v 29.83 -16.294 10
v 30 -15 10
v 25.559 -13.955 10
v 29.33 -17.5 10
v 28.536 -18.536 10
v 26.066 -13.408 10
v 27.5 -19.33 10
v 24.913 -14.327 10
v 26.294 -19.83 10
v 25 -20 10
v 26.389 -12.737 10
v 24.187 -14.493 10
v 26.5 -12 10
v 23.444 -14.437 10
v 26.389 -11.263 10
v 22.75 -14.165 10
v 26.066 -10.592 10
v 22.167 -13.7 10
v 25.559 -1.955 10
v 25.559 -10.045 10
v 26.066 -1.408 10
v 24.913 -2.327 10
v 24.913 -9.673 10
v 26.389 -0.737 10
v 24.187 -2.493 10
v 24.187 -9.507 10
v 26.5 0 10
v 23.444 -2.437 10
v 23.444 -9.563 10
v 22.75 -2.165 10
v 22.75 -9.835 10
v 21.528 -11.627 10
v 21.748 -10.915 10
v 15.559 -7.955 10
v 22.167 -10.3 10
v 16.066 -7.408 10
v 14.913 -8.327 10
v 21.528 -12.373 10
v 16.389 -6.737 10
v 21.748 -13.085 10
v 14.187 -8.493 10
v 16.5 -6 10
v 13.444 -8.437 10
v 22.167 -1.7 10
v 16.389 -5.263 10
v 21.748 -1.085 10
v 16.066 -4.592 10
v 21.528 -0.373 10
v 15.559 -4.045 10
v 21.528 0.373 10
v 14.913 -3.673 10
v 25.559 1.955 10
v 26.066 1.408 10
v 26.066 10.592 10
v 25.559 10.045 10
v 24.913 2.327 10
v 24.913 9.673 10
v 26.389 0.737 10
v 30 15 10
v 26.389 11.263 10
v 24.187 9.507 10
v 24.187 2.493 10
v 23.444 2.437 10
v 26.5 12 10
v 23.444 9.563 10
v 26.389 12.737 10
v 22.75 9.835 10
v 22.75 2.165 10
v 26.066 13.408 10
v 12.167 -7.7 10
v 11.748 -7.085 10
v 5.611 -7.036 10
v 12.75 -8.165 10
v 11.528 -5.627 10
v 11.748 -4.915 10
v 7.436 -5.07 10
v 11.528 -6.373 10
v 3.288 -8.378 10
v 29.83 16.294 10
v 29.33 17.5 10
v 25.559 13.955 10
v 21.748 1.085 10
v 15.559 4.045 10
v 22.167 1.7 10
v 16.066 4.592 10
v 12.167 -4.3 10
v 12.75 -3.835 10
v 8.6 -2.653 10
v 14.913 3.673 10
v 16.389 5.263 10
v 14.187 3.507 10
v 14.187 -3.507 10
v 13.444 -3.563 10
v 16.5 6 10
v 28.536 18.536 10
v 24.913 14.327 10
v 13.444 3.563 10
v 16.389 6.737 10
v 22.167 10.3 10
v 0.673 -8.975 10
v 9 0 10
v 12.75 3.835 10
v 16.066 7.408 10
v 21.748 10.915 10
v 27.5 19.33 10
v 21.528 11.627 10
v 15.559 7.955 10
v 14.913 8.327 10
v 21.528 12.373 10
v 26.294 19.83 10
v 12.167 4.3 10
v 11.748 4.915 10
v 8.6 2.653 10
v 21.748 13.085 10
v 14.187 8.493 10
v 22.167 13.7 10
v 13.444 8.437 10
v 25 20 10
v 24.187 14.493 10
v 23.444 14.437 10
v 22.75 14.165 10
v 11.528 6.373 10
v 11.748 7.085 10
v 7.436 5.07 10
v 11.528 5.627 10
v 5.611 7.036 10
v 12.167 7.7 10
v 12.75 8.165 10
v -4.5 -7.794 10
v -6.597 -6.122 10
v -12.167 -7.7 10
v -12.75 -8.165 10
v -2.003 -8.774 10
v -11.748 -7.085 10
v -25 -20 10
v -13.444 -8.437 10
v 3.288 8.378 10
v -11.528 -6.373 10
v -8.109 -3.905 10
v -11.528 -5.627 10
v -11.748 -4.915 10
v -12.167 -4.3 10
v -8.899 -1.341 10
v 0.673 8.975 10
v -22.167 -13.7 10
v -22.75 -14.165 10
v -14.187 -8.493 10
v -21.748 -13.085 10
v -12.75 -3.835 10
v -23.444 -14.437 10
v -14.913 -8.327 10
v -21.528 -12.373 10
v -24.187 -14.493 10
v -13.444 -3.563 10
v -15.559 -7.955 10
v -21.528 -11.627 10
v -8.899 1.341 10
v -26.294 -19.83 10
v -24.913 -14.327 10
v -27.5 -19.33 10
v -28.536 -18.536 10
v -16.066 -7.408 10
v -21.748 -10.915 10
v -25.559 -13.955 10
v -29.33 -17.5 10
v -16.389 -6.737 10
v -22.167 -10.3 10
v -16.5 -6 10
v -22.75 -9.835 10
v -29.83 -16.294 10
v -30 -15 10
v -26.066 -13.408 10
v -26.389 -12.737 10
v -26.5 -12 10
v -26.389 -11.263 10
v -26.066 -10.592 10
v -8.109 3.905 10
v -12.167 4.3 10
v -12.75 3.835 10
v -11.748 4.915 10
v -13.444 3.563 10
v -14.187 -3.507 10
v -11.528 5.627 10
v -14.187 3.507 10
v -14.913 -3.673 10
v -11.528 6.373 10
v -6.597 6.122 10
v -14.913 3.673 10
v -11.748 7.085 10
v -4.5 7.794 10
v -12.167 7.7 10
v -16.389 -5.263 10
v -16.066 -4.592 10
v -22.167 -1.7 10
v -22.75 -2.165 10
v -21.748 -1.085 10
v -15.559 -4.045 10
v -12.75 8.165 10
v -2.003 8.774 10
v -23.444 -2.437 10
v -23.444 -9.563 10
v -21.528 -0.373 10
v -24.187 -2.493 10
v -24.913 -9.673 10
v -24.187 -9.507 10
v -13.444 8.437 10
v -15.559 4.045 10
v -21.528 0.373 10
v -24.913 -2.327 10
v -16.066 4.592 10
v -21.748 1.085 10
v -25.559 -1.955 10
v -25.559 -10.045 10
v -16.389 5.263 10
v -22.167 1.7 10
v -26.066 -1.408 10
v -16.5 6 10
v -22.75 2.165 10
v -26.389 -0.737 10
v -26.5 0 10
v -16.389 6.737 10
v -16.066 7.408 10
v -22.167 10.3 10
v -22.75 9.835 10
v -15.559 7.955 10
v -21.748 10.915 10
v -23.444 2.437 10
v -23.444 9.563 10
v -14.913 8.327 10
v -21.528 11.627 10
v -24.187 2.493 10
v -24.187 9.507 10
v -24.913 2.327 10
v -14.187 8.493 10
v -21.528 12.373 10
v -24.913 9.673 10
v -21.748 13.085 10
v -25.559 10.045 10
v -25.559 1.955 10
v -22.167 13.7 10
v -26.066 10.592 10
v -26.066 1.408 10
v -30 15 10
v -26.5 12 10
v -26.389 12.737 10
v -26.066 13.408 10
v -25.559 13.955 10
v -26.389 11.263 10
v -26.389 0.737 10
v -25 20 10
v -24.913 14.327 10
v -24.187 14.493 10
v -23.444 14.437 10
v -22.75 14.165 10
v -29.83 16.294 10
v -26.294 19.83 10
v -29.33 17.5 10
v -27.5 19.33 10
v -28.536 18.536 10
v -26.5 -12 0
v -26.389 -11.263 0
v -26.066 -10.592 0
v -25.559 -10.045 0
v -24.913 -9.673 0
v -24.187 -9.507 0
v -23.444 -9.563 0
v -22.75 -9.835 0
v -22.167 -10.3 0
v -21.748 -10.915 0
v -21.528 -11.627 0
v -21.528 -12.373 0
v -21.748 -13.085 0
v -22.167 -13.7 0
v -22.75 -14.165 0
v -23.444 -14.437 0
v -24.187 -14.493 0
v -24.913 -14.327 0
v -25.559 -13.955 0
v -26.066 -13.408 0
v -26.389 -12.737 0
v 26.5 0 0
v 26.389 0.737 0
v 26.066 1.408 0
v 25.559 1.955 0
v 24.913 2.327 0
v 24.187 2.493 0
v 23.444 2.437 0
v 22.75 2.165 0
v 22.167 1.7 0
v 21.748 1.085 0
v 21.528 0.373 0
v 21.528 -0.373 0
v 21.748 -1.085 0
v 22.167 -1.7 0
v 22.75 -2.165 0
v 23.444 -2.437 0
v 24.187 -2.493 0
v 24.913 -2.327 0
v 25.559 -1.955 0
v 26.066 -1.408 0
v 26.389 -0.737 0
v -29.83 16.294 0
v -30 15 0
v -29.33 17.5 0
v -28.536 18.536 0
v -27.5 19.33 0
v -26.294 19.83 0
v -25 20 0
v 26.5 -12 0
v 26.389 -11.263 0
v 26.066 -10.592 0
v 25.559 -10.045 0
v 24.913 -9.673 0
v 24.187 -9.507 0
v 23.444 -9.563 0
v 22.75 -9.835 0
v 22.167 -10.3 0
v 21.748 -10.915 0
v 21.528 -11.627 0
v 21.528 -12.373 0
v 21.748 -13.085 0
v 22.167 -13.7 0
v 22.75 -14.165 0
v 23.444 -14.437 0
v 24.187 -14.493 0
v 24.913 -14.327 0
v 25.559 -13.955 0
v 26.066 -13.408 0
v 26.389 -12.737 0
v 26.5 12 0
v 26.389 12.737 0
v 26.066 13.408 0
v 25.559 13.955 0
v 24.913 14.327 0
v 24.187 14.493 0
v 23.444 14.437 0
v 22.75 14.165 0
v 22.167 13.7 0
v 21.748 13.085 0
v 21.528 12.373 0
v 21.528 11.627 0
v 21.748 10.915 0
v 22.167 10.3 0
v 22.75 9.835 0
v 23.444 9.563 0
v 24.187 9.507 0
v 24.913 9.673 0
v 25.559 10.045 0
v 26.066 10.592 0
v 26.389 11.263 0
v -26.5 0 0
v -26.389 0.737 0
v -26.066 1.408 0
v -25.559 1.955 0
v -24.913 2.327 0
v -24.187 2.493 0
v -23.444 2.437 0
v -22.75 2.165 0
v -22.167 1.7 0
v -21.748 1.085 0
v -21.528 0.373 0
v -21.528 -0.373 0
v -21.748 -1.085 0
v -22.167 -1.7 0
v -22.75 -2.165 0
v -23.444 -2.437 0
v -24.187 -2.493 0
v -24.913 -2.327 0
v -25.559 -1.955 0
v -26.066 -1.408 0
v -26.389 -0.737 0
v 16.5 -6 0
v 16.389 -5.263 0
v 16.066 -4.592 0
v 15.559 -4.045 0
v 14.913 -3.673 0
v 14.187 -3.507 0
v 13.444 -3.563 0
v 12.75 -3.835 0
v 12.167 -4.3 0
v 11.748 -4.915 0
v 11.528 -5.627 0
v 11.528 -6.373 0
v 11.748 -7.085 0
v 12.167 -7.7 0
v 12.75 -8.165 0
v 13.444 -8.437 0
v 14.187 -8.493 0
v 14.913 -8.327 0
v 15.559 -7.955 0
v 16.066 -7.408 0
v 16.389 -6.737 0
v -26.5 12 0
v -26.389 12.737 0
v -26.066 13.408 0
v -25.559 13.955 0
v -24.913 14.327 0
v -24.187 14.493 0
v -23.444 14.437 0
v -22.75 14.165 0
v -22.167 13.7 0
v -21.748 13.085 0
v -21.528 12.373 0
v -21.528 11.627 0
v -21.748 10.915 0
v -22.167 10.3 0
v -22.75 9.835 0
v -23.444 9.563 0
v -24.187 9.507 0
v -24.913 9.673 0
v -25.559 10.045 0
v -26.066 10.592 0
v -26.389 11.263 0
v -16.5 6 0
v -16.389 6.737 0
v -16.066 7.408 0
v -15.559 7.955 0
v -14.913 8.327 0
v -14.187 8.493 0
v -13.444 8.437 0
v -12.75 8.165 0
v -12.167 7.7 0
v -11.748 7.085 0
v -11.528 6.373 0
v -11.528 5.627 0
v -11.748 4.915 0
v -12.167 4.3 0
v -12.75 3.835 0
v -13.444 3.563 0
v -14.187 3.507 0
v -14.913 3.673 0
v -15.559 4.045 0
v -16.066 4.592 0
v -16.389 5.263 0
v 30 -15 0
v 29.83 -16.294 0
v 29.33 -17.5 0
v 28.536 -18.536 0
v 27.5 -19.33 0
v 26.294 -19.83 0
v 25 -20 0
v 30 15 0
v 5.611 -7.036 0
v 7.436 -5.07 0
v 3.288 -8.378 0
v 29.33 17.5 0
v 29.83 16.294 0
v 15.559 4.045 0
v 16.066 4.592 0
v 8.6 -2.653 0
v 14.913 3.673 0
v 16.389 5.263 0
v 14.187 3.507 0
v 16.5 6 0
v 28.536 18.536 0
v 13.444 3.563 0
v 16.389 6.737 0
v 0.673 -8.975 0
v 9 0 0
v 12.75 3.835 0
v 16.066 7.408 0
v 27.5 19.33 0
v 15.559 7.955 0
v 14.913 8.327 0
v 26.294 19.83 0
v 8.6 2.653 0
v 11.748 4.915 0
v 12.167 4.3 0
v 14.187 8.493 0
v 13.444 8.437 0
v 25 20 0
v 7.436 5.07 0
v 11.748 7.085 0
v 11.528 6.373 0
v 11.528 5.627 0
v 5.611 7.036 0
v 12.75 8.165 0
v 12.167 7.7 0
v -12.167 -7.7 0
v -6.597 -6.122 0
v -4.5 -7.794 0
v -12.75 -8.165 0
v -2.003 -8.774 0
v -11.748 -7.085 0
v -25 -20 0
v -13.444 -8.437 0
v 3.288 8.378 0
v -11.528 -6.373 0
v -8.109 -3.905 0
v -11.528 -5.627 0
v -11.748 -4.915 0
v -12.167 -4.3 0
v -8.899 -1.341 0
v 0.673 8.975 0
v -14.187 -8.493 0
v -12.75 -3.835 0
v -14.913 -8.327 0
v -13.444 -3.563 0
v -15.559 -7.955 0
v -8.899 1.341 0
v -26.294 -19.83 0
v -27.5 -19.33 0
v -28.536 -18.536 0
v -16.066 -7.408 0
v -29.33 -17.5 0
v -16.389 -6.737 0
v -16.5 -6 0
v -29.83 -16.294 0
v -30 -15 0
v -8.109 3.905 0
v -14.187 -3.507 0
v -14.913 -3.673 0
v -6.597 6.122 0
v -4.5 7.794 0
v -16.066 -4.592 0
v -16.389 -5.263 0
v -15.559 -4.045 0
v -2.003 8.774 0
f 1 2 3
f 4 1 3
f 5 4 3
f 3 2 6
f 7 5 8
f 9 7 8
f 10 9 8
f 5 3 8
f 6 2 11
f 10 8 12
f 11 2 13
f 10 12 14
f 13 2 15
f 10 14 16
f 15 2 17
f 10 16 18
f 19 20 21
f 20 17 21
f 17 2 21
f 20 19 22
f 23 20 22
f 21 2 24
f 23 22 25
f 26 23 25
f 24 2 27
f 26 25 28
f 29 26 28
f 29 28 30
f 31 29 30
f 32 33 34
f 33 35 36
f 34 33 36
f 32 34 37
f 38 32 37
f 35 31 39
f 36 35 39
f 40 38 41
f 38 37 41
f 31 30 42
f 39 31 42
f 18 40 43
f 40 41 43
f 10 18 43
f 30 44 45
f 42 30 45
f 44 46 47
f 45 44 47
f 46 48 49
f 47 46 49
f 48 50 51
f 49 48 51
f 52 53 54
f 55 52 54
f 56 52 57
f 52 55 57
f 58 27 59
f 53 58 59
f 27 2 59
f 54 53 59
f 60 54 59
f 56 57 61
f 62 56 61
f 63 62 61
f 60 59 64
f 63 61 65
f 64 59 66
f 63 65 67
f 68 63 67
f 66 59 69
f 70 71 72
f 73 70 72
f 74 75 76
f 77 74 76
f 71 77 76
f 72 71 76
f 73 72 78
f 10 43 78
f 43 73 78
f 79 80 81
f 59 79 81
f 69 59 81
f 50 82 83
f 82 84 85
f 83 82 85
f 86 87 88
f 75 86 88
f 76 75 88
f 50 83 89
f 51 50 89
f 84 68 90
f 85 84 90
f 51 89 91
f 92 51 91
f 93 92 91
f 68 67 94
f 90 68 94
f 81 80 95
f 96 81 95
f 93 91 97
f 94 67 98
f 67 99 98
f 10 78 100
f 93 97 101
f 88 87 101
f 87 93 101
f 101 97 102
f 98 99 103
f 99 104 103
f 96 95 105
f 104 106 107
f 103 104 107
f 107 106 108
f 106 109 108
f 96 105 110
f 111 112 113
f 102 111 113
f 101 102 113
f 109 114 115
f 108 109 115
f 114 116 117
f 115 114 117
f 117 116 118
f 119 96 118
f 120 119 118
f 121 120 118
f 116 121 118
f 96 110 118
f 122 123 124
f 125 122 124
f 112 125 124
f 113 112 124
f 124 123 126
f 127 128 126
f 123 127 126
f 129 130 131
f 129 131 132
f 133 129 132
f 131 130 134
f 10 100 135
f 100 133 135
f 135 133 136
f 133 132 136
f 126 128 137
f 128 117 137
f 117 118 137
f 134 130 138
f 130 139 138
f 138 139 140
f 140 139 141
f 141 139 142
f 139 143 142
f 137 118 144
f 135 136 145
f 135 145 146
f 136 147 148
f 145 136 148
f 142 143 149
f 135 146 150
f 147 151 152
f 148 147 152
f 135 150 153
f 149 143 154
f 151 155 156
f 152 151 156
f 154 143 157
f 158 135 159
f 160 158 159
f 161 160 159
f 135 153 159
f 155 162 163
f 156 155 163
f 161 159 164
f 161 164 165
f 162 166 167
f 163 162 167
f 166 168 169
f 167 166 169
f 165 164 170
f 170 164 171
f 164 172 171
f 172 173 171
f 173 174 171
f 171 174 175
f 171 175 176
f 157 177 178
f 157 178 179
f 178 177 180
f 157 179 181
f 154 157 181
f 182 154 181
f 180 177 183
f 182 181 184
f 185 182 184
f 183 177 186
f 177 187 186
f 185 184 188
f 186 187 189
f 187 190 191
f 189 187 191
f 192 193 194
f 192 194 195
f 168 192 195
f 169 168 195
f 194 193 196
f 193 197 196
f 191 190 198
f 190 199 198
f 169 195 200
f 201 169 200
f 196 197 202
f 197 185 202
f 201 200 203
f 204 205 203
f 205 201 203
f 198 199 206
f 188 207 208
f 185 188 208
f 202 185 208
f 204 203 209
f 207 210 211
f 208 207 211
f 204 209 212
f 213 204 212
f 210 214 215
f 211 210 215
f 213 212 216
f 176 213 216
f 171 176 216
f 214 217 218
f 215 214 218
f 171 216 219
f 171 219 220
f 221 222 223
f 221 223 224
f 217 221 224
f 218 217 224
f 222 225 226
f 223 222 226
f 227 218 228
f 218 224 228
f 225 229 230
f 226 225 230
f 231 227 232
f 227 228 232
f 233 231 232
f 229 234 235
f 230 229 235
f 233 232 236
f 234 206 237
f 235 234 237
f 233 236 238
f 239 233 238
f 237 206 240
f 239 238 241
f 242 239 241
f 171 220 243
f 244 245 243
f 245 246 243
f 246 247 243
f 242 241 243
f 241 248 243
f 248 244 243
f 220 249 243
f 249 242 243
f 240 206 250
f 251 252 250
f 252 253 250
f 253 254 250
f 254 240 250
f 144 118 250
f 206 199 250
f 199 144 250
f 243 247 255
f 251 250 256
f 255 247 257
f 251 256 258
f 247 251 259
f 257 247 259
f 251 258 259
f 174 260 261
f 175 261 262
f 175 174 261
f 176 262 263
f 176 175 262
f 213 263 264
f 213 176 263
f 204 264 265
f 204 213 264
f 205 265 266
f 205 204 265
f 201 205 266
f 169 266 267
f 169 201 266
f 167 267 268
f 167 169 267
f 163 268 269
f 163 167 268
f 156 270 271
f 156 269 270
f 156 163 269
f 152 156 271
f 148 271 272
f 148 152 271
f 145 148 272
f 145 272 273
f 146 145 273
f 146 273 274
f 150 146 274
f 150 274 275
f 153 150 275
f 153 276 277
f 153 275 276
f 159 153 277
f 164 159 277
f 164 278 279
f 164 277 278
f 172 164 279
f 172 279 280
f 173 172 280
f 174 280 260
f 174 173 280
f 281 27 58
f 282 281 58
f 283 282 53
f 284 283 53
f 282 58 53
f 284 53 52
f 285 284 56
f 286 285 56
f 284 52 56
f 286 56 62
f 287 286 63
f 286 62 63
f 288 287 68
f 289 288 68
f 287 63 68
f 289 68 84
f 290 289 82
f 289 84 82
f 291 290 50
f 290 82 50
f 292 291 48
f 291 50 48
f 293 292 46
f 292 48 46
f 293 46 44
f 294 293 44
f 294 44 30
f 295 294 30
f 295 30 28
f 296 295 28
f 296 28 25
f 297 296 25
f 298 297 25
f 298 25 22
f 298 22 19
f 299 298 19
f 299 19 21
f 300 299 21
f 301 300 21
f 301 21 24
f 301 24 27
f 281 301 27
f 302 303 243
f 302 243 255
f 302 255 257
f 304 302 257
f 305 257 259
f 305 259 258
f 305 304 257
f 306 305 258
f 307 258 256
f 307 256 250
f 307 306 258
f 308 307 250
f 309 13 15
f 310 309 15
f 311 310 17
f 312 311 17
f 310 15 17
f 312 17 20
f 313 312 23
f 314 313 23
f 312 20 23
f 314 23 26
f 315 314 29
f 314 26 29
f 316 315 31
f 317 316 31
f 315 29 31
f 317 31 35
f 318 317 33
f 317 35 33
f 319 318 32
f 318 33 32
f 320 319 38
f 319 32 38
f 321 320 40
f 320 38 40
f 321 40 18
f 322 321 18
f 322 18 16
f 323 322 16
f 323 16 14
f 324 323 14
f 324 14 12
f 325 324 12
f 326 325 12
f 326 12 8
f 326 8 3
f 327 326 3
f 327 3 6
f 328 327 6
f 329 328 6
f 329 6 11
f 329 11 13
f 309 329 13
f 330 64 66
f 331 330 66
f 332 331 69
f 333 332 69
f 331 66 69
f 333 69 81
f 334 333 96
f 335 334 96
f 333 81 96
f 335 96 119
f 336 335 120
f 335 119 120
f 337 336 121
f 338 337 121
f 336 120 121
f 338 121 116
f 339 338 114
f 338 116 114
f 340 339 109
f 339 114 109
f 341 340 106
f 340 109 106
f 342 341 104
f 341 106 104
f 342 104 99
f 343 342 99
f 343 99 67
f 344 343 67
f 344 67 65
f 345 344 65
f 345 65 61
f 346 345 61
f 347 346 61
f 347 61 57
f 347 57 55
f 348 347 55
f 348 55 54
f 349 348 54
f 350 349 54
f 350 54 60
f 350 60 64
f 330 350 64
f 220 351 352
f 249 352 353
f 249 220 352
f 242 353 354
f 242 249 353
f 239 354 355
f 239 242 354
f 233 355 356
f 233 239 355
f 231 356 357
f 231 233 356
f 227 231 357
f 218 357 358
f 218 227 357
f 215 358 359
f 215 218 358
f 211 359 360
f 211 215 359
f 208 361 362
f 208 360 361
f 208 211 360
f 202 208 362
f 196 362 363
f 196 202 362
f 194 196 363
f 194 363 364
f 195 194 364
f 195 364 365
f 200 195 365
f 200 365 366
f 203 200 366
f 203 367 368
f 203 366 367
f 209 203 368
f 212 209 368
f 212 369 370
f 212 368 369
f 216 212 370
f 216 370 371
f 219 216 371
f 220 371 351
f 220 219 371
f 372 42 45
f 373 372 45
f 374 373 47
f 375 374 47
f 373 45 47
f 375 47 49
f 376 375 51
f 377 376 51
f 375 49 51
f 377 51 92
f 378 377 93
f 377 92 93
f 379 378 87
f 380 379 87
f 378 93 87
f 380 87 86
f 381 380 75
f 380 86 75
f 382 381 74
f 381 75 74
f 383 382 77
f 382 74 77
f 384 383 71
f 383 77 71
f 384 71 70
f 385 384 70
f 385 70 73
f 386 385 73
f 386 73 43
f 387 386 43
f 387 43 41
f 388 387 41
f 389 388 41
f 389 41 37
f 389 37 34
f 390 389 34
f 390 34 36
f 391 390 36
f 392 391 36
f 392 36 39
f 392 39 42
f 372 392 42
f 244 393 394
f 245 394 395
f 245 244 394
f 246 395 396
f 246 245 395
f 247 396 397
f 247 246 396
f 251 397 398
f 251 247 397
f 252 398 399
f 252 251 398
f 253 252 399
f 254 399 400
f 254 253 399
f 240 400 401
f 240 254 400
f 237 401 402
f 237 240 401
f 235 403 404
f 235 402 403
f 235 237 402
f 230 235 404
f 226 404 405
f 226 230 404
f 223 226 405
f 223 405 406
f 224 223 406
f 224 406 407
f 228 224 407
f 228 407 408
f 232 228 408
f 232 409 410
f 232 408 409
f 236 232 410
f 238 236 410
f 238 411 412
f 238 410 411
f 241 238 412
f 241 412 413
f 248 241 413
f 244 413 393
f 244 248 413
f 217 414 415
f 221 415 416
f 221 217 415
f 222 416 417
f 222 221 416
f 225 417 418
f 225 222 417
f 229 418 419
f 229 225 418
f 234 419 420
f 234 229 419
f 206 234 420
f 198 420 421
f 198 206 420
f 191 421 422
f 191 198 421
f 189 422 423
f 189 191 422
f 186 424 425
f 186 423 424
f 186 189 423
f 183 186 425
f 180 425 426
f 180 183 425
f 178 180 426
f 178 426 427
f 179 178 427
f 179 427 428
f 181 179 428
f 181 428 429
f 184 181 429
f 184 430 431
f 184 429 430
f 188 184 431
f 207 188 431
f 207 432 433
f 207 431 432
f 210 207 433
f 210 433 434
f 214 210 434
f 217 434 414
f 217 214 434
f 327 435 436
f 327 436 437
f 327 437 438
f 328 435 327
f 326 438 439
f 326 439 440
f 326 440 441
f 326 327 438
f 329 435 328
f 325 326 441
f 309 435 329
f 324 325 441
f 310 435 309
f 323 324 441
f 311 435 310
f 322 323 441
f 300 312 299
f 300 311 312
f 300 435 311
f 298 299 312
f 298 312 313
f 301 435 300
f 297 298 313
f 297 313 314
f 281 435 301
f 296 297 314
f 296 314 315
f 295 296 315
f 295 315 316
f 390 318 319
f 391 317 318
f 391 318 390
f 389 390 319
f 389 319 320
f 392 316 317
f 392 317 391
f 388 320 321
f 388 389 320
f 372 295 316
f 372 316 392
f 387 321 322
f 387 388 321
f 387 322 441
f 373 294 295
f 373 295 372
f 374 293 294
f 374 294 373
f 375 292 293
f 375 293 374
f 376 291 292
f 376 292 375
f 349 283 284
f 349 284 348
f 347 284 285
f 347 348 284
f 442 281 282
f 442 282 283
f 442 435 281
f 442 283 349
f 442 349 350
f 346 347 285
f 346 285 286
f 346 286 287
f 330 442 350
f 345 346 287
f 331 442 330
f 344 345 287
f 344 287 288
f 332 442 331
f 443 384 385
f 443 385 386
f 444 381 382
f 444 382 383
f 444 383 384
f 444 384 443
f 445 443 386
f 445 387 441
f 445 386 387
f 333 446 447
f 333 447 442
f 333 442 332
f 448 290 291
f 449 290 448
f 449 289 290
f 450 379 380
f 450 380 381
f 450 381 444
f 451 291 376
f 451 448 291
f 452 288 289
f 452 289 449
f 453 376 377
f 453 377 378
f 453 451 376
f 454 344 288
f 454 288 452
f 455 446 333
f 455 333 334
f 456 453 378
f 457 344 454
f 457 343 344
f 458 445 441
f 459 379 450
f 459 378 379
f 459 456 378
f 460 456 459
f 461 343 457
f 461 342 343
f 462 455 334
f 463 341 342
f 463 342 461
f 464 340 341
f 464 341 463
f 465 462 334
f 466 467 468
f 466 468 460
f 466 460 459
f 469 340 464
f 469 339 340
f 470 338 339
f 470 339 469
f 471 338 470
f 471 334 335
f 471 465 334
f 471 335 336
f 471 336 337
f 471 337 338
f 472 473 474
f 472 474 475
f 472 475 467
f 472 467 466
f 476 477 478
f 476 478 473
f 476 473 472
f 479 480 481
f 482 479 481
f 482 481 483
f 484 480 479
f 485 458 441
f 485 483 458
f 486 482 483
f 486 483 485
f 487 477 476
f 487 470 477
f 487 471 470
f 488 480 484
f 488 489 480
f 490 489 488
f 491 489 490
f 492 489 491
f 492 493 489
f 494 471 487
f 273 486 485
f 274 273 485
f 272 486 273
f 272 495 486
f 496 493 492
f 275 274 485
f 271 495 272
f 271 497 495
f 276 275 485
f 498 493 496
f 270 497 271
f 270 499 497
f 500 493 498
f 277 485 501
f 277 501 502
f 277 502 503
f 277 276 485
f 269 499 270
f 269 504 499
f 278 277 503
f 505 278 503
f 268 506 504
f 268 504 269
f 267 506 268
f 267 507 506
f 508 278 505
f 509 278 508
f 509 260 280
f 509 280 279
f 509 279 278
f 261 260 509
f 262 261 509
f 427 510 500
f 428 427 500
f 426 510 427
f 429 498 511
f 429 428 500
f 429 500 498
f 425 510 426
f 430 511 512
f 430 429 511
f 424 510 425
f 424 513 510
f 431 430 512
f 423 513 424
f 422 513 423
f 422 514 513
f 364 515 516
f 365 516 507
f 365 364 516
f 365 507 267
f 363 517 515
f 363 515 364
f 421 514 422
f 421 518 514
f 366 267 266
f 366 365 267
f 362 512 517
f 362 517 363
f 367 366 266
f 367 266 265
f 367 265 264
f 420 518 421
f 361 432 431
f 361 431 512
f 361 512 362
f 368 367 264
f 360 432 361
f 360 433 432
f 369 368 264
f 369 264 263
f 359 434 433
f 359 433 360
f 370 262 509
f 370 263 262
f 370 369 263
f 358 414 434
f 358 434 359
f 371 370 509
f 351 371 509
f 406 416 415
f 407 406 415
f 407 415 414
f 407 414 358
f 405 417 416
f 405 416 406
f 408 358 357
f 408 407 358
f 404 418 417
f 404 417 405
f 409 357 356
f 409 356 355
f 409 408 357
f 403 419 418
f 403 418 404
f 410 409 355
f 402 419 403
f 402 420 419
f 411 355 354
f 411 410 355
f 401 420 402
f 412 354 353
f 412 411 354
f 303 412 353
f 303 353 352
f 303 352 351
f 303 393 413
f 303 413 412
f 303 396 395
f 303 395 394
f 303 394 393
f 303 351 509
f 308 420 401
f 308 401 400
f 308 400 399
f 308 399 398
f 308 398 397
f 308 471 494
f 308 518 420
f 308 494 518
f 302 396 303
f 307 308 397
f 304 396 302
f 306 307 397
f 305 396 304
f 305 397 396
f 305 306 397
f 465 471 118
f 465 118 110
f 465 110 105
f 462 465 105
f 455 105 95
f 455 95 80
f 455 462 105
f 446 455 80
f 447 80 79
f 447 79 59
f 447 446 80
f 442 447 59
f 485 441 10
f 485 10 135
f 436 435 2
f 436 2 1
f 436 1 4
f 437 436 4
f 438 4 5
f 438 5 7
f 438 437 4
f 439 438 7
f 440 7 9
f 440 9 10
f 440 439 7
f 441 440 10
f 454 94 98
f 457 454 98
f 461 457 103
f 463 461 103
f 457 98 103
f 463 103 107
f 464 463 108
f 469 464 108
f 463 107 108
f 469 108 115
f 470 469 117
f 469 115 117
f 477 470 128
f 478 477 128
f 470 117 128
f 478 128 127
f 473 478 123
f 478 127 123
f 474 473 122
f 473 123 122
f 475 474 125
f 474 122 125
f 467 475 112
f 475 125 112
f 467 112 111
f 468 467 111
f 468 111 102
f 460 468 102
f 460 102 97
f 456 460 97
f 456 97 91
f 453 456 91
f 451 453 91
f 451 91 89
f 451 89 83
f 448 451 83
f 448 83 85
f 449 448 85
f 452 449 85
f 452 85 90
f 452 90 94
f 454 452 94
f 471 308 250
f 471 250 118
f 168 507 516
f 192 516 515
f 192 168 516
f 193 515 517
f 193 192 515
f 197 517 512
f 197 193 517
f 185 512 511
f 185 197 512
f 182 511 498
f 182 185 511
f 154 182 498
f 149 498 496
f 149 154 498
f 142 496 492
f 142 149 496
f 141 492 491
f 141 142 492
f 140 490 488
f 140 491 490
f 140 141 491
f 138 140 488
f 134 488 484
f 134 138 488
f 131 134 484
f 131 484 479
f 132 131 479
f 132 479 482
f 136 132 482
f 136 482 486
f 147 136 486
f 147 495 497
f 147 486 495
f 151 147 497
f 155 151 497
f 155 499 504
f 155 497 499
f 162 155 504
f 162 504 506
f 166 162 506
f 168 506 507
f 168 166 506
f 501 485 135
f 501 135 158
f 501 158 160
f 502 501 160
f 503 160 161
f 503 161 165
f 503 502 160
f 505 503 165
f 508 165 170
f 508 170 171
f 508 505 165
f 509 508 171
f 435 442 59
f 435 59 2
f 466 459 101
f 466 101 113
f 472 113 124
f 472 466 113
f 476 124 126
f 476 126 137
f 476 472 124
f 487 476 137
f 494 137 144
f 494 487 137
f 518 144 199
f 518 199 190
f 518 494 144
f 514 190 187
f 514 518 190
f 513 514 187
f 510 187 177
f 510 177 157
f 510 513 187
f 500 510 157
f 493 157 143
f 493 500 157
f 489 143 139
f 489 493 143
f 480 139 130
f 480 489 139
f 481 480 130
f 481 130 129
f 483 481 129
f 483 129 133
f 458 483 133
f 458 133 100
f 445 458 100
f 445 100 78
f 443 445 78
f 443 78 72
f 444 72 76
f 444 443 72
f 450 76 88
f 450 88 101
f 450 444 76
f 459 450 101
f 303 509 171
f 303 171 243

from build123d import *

# Parameters (mm, degrees)
SKETCH_1_R          = 9
EXTRUDE_1_DEPTH     = 10
SKETCH_3_R          = 2.5
CUT_EXTRUDE_1_DEPTH = 11


with BuildPart() as part:
    # ｽｹｯﾁ1 → ﾎﾞｽ - 押し出し1 (new body)
    with BuildSketch(Plane.XY):
        with BuildLine():
            Line((-25, 20), (25, 20))
            ThreePointArc((25, 20), (28.535533906, 18.535533906), (30, 15))
            Line((30, 15), (30, -15))
            ThreePointArc((30, -15), (28.535533906, -18.535533906), (25, -20))
            Line((25, -20), (-25, -20))
            ThreePointArc((-25, -20), (-28.535533906, -18.535533906), (-30, -15))
            Line((-30, -15), (-30, 15))
            ThreePointArc((-30, 15), (-28.535533906, 18.535533906), (-25, 20))
        make_face()
        Circle(SKETCH_1_R, mode=Mode.SUBTRACT)
    extrude(amount=EXTRUDE_1_DEPTH)

    # ｽｹｯﾁ3 → ｶｯﾄ - 押し出し1 (cut, through all)
    with BuildSketch(Plane.XY.offset(10)):
        with Locations((14, 6)):
            Circle(SKETCH_3_R)
        with Locations((24, 0)):
            Circle(SKETCH_3_R)
        with Locations((24, 12)):
            Circle(SKETCH_3_R)
        with Locations((24, -12)):
            Circle(SKETCH_3_R)
        with Locations((14, -6)):
            Circle(SKETCH_3_R)
    cut_extrude_1 = extrude(amount=-CUT_EXTRUDE_1_DEPTH, mode=Mode.SUBTRACT)

    # ﾐﾗｰ1: ｶｯﾄ - 押し出し1 across plane
    add(cut_extrude_1.mirror(Plane(origin=(0, 0, 0), x_dir=(0, 0, 1), z_dir=(1, 0, 0))), mode=Mode.SUBTRACT)


solid = part.part
